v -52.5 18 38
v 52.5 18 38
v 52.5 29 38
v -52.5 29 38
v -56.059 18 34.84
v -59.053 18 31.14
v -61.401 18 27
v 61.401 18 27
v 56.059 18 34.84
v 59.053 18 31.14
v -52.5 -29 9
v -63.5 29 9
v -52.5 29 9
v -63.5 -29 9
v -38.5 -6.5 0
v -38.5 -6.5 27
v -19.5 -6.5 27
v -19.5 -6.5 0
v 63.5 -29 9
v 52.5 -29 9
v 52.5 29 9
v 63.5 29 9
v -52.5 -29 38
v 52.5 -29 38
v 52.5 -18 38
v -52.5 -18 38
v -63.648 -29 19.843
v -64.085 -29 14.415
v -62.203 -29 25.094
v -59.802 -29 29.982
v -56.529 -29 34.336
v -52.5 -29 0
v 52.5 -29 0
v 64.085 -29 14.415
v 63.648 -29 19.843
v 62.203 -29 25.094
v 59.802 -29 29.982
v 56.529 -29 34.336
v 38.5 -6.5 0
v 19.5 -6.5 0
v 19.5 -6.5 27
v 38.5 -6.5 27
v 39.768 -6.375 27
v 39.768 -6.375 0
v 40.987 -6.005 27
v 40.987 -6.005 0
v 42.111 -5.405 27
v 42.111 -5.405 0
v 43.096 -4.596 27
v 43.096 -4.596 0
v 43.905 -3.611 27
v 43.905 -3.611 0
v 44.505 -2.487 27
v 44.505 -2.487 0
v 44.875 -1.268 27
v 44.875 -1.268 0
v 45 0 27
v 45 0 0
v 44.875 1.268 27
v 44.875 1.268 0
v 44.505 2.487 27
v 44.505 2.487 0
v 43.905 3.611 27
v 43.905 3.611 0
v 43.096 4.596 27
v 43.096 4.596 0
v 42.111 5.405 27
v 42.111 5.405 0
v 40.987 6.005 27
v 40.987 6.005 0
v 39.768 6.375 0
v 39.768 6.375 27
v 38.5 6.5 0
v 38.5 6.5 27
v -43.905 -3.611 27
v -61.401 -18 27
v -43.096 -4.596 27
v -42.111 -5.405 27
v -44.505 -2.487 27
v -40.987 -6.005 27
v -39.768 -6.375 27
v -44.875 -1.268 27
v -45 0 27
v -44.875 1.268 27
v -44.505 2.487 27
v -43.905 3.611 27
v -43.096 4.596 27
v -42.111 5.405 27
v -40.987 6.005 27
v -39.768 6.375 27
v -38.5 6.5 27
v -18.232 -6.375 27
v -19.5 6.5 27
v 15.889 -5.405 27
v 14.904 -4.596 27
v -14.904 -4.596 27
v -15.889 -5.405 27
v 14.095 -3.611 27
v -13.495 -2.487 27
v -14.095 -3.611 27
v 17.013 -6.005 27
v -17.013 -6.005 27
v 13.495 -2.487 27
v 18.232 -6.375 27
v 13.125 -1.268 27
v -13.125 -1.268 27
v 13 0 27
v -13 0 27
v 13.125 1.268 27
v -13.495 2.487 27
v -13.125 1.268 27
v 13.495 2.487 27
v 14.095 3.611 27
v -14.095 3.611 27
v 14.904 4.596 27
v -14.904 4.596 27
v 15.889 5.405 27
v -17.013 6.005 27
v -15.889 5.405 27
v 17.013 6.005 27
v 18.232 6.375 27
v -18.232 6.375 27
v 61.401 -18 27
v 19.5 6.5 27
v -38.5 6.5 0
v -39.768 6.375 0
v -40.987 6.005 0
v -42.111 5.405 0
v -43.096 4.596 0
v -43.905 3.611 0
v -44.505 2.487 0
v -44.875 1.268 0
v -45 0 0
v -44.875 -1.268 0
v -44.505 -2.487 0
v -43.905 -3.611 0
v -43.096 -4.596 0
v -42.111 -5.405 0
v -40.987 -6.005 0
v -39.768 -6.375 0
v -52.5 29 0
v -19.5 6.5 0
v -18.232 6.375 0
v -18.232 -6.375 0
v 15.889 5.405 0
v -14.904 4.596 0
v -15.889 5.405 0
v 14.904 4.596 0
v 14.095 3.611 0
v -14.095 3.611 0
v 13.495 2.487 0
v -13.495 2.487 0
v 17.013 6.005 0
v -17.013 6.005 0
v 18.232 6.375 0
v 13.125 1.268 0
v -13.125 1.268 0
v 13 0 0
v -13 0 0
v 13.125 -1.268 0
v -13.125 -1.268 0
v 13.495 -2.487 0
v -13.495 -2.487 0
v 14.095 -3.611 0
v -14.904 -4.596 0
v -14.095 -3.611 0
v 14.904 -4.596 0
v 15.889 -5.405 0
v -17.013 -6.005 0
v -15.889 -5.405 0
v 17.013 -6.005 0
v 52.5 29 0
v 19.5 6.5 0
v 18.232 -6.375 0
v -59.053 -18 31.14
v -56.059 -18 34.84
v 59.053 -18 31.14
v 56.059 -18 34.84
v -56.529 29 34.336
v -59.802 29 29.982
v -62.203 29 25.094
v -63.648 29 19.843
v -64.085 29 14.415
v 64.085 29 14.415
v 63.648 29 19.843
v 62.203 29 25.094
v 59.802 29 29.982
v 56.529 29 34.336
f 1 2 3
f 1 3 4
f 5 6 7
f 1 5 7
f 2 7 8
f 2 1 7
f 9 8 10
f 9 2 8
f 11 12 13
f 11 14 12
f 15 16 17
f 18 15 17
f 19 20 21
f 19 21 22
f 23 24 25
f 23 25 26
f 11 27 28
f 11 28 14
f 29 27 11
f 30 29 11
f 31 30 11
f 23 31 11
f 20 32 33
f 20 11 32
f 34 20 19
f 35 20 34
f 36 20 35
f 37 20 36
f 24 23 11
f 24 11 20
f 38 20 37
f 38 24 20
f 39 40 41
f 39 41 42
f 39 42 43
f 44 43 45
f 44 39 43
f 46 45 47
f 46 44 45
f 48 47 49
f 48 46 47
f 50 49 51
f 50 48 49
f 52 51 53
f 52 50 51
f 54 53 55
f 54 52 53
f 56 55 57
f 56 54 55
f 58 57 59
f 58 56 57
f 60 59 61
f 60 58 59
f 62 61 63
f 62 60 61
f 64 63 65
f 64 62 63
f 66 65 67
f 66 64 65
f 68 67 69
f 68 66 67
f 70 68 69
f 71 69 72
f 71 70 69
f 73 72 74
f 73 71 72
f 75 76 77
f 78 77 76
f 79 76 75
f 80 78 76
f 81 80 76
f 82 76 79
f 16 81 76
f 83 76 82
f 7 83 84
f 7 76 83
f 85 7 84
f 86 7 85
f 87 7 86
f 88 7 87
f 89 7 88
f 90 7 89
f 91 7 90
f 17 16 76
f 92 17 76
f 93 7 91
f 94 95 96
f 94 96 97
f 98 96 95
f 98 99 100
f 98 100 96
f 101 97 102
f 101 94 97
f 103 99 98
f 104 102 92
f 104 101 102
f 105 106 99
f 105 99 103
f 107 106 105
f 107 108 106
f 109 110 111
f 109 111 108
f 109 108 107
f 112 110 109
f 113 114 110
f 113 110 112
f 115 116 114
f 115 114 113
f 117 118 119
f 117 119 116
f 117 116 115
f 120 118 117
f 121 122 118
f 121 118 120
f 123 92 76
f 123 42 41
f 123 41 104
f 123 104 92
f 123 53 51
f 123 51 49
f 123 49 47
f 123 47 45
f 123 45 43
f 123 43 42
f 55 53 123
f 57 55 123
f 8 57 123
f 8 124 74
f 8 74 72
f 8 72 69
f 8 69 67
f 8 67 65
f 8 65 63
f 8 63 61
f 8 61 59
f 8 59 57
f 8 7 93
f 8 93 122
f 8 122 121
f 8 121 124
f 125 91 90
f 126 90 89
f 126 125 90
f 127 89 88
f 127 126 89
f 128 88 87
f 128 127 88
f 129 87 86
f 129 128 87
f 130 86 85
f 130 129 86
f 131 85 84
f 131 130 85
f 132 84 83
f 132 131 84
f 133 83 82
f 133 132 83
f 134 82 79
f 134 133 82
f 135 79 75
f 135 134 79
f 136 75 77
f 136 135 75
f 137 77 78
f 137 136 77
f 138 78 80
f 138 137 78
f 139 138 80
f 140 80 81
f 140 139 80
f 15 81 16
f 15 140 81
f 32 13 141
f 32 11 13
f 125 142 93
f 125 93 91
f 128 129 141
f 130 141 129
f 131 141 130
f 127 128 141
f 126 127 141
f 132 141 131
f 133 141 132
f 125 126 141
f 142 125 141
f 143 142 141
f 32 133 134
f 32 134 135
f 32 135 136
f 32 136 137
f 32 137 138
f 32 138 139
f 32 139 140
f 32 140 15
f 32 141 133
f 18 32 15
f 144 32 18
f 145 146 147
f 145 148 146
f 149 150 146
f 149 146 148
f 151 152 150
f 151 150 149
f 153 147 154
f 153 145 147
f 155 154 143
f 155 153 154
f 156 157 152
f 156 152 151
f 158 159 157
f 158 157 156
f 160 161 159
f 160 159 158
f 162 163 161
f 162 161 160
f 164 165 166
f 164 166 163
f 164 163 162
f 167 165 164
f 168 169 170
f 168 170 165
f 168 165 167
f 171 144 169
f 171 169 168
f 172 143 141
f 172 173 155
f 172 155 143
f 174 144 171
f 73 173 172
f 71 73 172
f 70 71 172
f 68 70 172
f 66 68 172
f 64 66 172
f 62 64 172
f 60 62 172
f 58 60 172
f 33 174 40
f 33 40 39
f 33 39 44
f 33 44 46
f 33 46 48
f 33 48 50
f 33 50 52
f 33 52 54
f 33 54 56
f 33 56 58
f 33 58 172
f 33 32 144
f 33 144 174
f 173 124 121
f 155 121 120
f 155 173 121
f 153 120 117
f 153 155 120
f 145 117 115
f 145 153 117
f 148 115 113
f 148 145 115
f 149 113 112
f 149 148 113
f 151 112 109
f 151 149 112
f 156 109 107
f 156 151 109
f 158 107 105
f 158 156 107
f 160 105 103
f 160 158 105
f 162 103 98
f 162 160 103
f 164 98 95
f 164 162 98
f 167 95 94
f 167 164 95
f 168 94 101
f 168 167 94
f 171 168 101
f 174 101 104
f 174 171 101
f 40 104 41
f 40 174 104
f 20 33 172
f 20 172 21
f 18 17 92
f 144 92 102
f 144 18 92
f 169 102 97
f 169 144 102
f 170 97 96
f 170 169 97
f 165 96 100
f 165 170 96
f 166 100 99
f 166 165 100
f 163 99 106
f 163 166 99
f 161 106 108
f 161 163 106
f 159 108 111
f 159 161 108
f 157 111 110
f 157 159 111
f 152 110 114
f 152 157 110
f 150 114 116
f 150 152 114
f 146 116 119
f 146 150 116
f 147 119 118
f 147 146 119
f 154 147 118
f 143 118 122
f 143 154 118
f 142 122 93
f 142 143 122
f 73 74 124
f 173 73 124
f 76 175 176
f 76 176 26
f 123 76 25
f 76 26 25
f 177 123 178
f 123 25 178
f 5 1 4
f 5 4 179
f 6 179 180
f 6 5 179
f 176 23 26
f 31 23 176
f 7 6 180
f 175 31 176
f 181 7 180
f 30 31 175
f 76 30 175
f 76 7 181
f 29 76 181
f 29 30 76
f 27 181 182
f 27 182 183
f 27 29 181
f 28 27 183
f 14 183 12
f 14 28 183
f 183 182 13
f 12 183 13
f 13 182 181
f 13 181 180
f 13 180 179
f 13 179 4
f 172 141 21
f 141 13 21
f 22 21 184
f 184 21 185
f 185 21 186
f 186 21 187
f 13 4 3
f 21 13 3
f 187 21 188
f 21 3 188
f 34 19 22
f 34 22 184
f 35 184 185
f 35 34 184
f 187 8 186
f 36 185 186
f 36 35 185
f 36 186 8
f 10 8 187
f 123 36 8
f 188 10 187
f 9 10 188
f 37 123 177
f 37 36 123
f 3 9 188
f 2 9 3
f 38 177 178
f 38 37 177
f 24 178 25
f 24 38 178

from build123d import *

# Parameters (mm, degrees)
F1_DEPTH = 29
F2_W     = 124.405438
F2_H     = 36
F3_DEPTH = 11
F5_DEPTH = 38.001


with BuildPart() as f1:
    # F0 (on Front) → F1 (new body, symmetric)
    with BuildSketch(Plane.XZ):
        with BuildLine():
            Line((-52.5, 0), (0, 0))
            Line((0, 0), (52.5, 0))
            Line((52.5, 0), (52.5, 9))
            Line((52.5, 9), (63.5, 9))
            ThreePointArc((63.5, 9), (62.202719, 25.094135), (52.5, 38))
            Line((52.5, 38), (0, 38))
            Line((0, 38), (-52.5, 38))
            ThreePointArc((-52.5, 38), (-62.202719, 25.094135), (-63.5, 9))
            Line((-63.5, 9), (-52.5, 9))
            Line((-52.5, 9), (-52.5, 0))
        make_face()
    extrude(amount=F1_DEPTH, both=True)

    # F2 (on face) → F3 (cut)
    with BuildSketch(Plane.XY.offset(38)):
        Rectangle(F2_W, F2_H)
    extrude(amount=-F3_DEPTH, mode=Mode.SUBTRACT)

    # F4 (on Top) → F5 (cut, through all)
    with BuildSketch(Plane.XY):
        with BuildLine():
            Line((-19.5, 6.5), (-38.5, 6.5))
            ThreePointArc((-38.5, 6.5), (-45, 0), (-38.5, -6.5))
            Line((-38.5, -6.5), (-19.5, -6.5))
            ThreePointArc((-19.5, -6.5), (-13, 0), (-19.5, 6.5))
        make_face()
        with BuildLine():
            ThreePointArc((19.5, 6.5), (13, 0), (19.5, -6.5))
            Line((19.5, -6.5), (38.5, -6.5))
            ThreePointArc((38.5, -6.5), (45, 0), (38.5, 6.5))
            Line((38.5, 6.5), (19.5, 6.5))
        make_face()
    extrude(amount=F5_DEPTH, mode=Mode.SUBTRACT)


solid = f1.part
